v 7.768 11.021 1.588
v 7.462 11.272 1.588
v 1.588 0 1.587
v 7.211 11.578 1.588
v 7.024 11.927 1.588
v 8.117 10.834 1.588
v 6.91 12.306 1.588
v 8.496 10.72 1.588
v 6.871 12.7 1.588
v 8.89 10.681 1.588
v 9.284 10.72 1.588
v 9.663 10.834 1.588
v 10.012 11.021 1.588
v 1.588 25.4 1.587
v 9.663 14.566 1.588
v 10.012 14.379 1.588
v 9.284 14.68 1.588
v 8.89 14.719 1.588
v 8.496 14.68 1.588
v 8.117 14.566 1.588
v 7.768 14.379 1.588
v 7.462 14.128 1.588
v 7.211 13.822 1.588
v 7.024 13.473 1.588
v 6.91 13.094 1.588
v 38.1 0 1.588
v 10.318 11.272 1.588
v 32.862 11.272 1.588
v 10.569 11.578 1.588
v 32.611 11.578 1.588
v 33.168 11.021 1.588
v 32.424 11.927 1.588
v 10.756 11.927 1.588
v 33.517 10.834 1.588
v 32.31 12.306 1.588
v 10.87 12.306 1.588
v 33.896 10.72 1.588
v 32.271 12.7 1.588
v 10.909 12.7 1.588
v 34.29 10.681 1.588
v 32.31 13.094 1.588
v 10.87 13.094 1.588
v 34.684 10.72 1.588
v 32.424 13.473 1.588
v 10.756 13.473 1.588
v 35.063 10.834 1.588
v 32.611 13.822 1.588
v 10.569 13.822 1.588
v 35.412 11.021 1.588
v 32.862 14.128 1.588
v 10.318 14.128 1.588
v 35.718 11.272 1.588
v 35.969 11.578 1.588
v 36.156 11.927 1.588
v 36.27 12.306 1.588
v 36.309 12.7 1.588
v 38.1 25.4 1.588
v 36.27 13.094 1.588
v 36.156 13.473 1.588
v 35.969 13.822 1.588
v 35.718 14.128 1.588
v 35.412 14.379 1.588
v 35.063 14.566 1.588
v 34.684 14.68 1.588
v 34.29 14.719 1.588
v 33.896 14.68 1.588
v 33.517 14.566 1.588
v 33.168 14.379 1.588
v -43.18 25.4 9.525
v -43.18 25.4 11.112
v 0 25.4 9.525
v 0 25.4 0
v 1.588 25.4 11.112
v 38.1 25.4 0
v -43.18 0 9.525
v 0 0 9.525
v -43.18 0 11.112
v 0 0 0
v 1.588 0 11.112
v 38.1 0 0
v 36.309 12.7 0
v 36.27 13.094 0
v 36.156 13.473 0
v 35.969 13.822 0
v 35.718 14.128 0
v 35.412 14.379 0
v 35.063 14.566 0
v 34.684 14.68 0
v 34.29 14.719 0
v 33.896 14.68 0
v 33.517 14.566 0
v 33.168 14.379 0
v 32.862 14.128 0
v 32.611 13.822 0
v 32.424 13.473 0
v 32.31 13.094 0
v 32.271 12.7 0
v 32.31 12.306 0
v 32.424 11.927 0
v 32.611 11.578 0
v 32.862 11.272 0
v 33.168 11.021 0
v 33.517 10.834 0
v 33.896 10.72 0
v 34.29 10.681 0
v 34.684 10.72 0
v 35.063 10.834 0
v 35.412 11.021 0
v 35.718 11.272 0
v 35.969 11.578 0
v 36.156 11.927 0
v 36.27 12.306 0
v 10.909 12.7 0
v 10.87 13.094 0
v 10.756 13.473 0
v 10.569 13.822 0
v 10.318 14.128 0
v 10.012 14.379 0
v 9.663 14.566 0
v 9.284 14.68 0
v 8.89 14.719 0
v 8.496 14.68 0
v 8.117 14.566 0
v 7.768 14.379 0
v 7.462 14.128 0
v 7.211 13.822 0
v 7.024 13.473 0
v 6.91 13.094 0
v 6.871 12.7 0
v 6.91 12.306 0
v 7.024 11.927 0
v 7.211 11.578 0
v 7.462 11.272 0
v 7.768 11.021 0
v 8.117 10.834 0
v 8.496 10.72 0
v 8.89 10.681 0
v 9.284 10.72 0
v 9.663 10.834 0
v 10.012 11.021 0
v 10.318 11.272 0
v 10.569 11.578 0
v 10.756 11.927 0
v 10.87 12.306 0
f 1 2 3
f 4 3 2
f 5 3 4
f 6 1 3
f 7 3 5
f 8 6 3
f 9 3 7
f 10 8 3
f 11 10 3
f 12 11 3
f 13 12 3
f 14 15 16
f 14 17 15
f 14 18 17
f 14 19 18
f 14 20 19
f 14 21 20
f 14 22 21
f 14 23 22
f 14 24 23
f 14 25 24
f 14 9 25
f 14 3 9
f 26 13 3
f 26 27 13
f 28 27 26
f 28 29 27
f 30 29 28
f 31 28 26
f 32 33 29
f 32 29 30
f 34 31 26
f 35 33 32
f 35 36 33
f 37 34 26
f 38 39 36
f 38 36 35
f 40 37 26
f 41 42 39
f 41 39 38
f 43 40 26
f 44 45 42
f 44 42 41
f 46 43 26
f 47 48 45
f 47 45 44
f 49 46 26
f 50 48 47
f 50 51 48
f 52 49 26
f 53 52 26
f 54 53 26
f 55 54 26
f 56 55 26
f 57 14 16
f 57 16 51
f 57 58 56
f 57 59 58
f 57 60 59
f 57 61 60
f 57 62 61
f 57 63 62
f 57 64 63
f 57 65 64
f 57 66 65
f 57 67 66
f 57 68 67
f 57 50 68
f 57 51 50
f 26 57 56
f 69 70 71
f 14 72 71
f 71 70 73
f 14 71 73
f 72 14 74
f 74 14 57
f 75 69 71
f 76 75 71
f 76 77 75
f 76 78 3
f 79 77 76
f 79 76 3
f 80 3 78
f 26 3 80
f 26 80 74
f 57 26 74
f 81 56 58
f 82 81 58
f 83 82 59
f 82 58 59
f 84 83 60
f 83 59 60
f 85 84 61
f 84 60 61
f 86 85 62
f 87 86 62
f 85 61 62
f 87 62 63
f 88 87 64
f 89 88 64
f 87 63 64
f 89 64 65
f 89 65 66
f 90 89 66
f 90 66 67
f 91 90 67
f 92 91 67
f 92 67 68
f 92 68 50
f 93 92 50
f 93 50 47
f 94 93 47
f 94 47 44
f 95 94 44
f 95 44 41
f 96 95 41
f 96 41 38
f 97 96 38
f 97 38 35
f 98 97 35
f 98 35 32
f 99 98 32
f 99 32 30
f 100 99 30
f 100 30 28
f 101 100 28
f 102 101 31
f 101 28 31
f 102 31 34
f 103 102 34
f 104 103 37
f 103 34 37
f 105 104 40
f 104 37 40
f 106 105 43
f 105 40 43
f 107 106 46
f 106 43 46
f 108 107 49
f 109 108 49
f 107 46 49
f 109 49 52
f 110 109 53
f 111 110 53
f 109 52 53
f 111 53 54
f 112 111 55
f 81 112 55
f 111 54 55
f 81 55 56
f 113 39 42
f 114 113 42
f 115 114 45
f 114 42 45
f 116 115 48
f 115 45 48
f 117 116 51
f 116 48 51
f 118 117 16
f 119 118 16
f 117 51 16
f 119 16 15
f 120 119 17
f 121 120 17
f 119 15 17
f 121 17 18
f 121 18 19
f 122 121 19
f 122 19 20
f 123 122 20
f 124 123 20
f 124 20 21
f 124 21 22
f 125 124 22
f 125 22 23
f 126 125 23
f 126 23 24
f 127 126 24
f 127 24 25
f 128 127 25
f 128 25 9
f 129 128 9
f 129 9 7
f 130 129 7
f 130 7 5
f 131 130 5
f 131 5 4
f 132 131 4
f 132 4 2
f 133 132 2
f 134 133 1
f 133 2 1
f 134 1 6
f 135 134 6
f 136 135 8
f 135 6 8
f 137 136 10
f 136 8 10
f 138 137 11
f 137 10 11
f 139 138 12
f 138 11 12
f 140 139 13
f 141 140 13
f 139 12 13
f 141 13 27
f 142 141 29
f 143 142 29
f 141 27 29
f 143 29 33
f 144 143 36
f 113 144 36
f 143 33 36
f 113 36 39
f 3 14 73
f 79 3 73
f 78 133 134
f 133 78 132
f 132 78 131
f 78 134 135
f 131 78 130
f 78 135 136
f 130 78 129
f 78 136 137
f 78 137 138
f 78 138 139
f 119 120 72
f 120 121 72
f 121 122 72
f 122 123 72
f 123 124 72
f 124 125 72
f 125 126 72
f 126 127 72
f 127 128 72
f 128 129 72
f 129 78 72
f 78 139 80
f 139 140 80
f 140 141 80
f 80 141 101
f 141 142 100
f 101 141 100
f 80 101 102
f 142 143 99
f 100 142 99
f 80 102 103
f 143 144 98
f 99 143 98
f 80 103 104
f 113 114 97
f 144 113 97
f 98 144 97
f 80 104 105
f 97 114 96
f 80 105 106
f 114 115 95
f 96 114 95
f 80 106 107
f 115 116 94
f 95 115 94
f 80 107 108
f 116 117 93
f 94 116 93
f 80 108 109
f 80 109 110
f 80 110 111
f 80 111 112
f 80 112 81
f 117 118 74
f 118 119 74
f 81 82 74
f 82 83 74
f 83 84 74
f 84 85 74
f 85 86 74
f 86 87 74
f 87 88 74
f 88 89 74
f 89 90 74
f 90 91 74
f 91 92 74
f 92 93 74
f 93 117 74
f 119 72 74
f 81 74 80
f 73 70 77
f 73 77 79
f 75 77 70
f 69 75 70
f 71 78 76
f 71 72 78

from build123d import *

# Parameters (mm, degrees)
SKETCH1_W           = 38.1
SKETCH1_H           = 25.4
BOSS_EXTRUDE1_DEPTH = 1.5875
SKETCH3_W           = 9.525
SKETCH3_H           = 25.4
BOSS_EXTRUDE2_DEPTH = 1.5875
SKETCH4_W           = 43.18
SKETCH4_H           = 25.4
BOSS_EXTRUDE3_DEPTH = 1.5875
SKETCH2_R           = 2.0193
CUT_EXTRUDE1_DEPTH  = 2.54
LPATTERN1_COUNT     = 2
LPATTERN1_PITCH     = 25.4


with BuildPart() as part:
    # Sketch1 → Boss-Extrude1 (new body)
    with BuildSketch(Plane.XY):
        with Locations((19.05, 12.7)):
            Rectangle(SKETCH1_W, SKETCH1_H)
    extrude(amount=BOSS_EXTRUDE1_DEPTH)

    # Sketch3 → Boss-Extrude2 (add)
    with BuildSketch(Plane.ZY):
        with Locations((6.35, 12.7)):
            Rectangle(SKETCH3_W, SKETCH3_H)
    extrude(amount=-BOSS_EXTRUDE2_DEPTH)

    # Sketch4 → Boss-Extrude3 (add)
    with BuildSketch(Plane.XY.offset(11.1125)):
        with Locations((-21.59, 12.7)):
            Rectangle(SKETCH4_W, SKETCH4_H)
    extrude(amount=-BOSS_EXTRUDE3_DEPTH)

    # Sketch2 → Cut-Extrude1 (cut)
    with BuildSketch(Plane.XY.offset(1.5875)):
        with Locations((34.29, 12.7)):
            Circle(SKETCH2_R)
    cut_extrude1 = extrude(amount=-CUT_EXTRUDE1_DEPTH, mode=Mode.SUBTRACT)

    # LPattern1: Cut-Extrude1 ×2
    with Locations(*[(-i * LPATTERN1_PITCH, 0, 0) for i in range(1, LPATTERN1_COUNT)]):
        add(cut_extrude1, mode=Mode.SUBTRACT)


solid = part.part
